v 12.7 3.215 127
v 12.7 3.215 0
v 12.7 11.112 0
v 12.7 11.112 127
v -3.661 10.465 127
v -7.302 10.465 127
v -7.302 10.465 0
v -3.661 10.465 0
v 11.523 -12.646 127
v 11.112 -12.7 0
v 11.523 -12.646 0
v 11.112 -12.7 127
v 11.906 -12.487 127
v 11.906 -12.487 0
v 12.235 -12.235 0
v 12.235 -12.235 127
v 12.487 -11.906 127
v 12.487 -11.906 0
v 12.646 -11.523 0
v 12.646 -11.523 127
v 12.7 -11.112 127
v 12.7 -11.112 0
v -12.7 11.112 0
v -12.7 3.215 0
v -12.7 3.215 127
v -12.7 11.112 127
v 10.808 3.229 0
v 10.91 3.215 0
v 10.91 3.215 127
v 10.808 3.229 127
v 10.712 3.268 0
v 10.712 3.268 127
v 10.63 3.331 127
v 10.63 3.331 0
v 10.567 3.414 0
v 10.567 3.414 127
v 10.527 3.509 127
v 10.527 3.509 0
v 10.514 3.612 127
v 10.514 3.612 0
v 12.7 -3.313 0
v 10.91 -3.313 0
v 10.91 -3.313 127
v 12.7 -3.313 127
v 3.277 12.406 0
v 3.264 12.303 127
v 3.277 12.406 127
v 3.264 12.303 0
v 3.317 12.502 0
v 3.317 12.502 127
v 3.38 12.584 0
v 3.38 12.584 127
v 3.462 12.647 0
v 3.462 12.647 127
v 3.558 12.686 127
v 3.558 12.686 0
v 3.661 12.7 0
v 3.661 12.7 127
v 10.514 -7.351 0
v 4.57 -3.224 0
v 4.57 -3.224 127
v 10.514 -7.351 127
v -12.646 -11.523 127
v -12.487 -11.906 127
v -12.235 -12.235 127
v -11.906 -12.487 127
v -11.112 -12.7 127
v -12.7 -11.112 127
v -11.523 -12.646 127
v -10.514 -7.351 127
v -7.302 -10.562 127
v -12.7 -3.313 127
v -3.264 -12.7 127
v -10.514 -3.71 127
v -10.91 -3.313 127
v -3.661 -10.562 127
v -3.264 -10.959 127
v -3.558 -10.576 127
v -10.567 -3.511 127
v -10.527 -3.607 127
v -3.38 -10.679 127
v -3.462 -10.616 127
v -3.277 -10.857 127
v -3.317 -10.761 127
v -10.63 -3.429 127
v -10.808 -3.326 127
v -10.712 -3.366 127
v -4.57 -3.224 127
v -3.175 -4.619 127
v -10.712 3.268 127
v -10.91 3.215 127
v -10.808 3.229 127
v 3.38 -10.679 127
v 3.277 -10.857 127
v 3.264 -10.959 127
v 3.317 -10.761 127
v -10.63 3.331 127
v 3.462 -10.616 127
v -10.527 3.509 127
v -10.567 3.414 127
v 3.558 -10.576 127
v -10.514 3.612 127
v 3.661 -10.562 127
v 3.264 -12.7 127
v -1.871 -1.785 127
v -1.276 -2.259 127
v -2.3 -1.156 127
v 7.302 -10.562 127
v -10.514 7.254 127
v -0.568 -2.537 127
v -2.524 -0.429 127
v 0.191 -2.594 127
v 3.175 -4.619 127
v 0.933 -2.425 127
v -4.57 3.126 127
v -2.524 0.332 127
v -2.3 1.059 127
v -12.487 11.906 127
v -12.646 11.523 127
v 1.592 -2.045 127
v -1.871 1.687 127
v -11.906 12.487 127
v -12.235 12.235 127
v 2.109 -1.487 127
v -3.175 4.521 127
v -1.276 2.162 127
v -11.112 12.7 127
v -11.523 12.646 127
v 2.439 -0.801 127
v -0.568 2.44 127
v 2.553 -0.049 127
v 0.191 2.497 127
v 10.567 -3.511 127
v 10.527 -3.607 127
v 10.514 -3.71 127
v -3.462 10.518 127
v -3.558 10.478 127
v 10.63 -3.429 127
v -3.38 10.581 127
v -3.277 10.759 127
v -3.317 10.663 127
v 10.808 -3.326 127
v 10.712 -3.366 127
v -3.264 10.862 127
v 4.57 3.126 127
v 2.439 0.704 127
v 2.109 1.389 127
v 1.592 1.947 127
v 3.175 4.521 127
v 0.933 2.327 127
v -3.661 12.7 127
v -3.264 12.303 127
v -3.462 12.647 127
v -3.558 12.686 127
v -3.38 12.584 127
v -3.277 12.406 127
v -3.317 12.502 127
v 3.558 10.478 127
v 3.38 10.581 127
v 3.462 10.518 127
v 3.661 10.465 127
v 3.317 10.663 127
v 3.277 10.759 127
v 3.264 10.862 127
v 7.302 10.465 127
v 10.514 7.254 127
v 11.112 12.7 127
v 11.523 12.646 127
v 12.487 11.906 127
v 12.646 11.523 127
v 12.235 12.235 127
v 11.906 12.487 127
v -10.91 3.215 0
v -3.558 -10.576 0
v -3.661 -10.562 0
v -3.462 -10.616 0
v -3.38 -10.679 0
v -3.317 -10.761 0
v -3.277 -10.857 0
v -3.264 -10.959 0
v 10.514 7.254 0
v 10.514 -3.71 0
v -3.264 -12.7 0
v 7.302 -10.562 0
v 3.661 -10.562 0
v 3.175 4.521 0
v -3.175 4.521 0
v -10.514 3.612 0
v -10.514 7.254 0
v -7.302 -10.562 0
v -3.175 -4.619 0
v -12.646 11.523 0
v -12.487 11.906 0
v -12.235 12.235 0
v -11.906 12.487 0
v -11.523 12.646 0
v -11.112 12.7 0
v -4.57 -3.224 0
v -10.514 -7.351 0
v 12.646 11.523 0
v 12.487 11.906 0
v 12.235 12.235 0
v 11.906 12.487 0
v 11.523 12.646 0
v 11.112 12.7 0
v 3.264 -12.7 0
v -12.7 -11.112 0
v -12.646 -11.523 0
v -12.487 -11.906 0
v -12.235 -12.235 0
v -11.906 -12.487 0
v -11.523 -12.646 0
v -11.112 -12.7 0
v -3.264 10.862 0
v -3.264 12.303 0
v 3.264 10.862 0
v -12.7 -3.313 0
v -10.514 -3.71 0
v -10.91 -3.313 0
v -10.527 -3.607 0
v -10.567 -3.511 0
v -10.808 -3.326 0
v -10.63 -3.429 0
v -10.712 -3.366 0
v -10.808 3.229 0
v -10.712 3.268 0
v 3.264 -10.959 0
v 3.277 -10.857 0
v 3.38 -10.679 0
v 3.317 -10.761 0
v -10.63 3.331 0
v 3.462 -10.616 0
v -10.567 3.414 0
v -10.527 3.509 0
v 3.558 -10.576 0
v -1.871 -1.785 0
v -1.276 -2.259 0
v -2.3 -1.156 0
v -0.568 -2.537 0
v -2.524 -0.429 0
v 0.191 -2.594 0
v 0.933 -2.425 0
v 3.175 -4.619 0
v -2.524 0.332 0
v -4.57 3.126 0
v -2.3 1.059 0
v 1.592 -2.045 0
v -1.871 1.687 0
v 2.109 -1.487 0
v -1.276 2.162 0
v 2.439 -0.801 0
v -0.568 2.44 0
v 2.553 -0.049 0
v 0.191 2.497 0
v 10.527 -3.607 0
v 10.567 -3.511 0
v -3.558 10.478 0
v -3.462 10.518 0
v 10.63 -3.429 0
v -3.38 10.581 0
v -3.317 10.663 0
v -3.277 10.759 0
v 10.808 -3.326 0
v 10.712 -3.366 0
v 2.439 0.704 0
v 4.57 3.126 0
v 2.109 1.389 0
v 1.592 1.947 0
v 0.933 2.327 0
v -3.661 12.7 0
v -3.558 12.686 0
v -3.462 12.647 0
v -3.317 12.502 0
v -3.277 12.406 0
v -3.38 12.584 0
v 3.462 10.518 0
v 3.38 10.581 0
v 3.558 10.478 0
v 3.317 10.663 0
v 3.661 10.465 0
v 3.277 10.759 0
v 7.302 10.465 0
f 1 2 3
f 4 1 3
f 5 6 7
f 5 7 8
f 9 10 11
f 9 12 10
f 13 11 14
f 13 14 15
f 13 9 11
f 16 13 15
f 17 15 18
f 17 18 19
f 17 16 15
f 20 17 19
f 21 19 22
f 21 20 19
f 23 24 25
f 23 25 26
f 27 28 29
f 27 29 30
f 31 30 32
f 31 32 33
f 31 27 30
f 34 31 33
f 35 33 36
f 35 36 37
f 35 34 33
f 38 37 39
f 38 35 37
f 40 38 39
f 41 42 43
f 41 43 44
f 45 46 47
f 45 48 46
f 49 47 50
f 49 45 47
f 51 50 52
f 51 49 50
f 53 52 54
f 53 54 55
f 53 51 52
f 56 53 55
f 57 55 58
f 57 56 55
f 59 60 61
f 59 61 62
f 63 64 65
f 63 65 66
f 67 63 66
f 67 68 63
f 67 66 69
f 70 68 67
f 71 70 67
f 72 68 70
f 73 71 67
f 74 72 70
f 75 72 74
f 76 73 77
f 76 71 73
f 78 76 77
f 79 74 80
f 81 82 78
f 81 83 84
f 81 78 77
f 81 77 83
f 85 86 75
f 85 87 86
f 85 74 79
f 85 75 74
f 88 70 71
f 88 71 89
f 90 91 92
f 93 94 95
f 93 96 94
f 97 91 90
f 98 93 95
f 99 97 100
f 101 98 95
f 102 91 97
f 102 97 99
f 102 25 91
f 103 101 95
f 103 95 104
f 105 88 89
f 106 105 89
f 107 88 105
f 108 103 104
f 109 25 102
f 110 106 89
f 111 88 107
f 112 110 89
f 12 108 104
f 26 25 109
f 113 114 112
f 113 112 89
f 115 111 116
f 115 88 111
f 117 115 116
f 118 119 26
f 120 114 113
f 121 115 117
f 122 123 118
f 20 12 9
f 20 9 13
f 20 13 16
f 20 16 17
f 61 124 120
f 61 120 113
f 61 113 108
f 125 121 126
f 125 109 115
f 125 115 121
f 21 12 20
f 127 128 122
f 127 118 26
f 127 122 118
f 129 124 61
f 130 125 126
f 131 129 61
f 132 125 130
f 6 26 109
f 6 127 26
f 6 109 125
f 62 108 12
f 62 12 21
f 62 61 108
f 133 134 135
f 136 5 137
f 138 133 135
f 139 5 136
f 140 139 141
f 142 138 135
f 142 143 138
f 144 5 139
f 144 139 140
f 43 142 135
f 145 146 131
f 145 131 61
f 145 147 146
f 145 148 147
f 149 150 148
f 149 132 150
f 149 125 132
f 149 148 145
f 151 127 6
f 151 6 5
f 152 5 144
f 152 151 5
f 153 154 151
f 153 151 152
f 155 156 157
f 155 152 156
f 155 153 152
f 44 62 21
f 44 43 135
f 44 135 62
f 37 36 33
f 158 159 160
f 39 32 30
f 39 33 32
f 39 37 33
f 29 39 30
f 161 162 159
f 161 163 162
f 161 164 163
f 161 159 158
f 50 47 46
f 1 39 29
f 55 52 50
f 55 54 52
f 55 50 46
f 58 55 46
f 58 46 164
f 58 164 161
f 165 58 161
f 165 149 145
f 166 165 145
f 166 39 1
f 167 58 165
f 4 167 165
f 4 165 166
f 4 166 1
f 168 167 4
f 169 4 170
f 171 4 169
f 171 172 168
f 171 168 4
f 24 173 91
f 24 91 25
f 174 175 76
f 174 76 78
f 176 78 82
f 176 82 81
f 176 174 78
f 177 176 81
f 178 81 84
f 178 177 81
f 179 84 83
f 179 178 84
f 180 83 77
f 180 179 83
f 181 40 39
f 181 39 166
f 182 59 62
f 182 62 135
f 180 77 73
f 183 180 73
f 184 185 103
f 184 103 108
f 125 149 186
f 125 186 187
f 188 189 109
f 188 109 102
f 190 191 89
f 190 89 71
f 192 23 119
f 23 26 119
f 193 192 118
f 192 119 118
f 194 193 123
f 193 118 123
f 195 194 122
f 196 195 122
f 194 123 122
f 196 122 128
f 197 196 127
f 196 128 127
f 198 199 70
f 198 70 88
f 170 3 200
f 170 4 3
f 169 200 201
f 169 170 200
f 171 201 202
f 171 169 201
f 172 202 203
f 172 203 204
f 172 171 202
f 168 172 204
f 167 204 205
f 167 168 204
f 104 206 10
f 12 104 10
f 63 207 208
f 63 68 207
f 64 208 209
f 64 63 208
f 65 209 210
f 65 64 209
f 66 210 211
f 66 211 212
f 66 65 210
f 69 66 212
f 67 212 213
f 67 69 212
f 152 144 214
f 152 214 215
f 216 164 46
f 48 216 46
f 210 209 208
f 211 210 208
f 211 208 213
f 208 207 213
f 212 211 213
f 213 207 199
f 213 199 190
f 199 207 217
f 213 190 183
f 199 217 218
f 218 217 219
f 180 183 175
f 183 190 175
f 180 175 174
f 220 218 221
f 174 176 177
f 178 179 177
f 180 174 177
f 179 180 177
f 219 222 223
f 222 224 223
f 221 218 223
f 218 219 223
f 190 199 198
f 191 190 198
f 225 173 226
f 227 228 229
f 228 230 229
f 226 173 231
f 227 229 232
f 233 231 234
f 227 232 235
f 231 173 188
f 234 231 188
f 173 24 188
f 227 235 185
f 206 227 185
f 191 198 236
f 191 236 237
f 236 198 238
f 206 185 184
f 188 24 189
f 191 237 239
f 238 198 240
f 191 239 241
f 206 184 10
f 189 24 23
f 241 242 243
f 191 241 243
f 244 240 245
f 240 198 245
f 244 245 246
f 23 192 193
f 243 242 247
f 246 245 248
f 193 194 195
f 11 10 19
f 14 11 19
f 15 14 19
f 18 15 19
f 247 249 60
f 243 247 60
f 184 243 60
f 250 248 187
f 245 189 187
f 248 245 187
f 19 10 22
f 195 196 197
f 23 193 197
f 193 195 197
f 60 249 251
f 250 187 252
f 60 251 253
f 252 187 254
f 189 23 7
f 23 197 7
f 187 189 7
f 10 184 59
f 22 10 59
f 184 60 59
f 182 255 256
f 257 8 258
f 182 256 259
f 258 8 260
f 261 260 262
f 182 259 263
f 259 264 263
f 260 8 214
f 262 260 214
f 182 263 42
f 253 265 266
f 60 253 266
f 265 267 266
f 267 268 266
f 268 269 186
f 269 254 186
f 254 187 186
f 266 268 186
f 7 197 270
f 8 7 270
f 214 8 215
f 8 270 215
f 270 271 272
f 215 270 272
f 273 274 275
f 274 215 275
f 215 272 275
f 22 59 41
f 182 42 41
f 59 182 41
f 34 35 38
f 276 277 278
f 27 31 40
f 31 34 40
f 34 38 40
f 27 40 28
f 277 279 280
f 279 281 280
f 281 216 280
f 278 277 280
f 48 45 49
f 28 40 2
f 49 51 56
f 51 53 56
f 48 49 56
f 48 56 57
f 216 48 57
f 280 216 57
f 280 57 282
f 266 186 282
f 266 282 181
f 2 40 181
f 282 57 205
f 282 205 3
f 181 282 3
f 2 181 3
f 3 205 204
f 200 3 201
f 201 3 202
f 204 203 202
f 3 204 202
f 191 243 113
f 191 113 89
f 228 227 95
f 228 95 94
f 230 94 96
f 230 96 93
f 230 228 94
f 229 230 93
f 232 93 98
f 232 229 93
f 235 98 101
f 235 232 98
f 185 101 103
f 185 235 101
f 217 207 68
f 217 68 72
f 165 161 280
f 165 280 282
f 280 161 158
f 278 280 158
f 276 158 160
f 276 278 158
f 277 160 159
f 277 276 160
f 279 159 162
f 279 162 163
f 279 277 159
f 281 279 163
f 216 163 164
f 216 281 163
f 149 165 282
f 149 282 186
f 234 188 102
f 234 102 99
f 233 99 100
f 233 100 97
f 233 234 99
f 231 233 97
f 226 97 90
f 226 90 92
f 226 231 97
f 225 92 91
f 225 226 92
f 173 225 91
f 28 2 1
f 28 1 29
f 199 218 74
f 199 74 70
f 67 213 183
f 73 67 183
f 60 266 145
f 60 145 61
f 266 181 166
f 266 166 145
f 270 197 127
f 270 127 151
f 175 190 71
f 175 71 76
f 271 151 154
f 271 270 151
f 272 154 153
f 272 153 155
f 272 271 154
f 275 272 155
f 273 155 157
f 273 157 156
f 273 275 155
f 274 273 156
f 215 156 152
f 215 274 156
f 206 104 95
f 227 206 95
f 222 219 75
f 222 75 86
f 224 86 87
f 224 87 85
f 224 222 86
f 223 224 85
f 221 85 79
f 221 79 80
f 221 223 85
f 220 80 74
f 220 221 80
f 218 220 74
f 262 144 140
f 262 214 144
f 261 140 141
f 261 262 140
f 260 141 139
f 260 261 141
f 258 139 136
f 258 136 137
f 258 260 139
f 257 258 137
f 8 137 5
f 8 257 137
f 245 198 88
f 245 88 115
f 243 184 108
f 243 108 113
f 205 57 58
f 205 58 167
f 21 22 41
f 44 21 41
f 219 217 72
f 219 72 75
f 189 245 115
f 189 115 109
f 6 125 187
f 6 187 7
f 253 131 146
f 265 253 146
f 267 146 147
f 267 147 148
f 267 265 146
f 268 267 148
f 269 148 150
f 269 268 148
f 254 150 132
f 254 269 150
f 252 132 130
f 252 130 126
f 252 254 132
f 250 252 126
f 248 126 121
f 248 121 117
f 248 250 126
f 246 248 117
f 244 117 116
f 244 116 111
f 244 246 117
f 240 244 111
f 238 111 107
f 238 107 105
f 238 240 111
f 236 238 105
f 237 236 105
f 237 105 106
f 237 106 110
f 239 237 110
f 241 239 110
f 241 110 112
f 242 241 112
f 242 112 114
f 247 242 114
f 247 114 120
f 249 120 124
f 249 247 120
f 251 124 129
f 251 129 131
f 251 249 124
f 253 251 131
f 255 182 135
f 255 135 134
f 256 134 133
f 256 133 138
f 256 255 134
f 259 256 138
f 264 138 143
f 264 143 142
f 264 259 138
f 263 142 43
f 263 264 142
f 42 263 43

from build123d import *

# Parameters (mm, degrees)
SKETCH1_W           = 25.4
SKETCH1_H           = 25.4
BOSS_EXTRUDE1_DEPTH = 127
FILLET1_R           = 1.5875
HOLE1_OUTLINE_R     = 2.5527
HOLE1_DEPTH         = 127
SKETCH7_W           = 6.5278
SKETCH7_H           = 2.2352
CUT_EXTRUDE2_DEPTH  = 127
FILLET4_R           = 0.396875
CIRPATTERN2_DEPTH   = 127


# Read off the part's stored shape, not the designer's step: Hole1, CirPattern2
with BuildPart() as part:
    # Sketch1 → Boss-Extrude1 (new body)
    with BuildSketch(Plane.XY):
        Rectangle(SKETCH1_W, SKETCH1_H)
    extrude(amount=BOSS_EXTRUDE1_DEPTH)

    # Fillet1
    fillet1_edges = [part.edges().sort_by_distance(p)[0] for p in [
        (12.7, -12.7, 63.5),
        (-12.7, -12.7, 63.5),
        (-12.7, 12.7, 63.5),
        (12.7, 12.7, 63.5),
    ]]
    fillet(fillet1_edges, radius=FILLET1_R)

    # Hole1 outline → Hole1 (cut)
    with BuildSketch(Plane.XY):
        with Locations((0, -0.048792482)):
            Circle(HOLE1_OUTLINE_R)
    extrude(amount=HOLE1_DEPTH, mode=Mode.SUBTRACT)

    # Sketch7 → Cut-Extrude2 (cut)
    with BuildSketch(Plane.XY.offset(127)):
        with Locations((0, 11.5824)):
            Rectangle(SKETCH7_W, SKETCH7_H)
        Polygon((-3.175, 4.5212), (-7.3025, 10.4648), (7.3025, 10.4648), (3.175, 4.5212), align=None)
    extrude(amount=-CUT_EXTRUDE2_DEPTH, mode=Mode.SUBTRACT)

    # Fillet4
    fillet4_edges = [part.edges().sort_by_distance(p)[0] for p in [
        (-3.2639, 10.4648, 63.5),
        (-3.2639, 12.7, 63.5),
        (3.2639, 12.7, 63.5),
        (3.2639, 10.4648, 63.5),
    ]]
    fillet(fillet4_edges, radius=FILLET4_R)

    # CirPattern2 outline → CirPattern2 (cut)
    with BuildSketch(Plane.XY):
        with BuildLine():
            ThreePointArc((-3.660775, -10.562384964), (-3.380141996, -10.67862696), (-3.2639, -10.959259964))
            Line((-3.2639, -10.959259964), (-3.2639, -12.7))
            Line((-3.2639, -12.7), (3.2639, -12.7))
            Line((3.2639, -12.7), (3.2639, -10.959259964))
            ThreePointArc((3.2639, -10.959259964), (3.380141996, -10.67862696), (3.660775, -10.562384964))
            Line((3.660775, -10.562384964), (7.3025, -10.562384964))
            Line((7.3025, -10.562384964), (3.175, -4.618784964))
            Line((3.175, -4.618784964), (-3.175, -4.618784964))
            Line((-3.175, -4.618784964), (-7.3025, -10.562384964))
            Line((-7.3025, -10.562384964), (-3.660775, -10.562384964))
        make_face()
        with BuildLine():
            Line((-12.7, -3.312692482), (-10.910467482, -3.312692482))
            ThreePointArc((-10.910467482, -3.312692482), (-10.629834478, -3.428934478), (-10.513592482, -3.709567482))
            Line((-10.513592482, -3.709567482), (-10.513592482, -7.351292482))
            Line((-10.513592482, -7.351292482), (-4.569992482, -3.223792482))
            Line((-4.569992482, -3.223792482), (-4.569992482, 3.126207518))
            Line((-4.569992482, 3.126207518), (-10.513592482, 7.253707518))
            Line((-10.513592482, 7.253707518), (-10.513592482, 3.611982518))
            ThreePointArc((-10.513592482, 3.611982518), (-10.629834478, 3.331349514), (-10.910467482, 3.215107518))
            Line((-10.910467482, 3.215107518), (-12.7, 3.215107518))
            Line((-12.7, 3.215107518), (-12.7, -3.312692482))
        make_face()
        with BuildLine():
            ThreePointArc((10.513592482, -3.709567482), (10.629834478, -3.428934478), (10.910467482, -3.312692482))
            Line((10.910467482, -3.312692482), (12.7, -3.312692482))
            Line((12.7, -3.312692482), (12.7, 3.215107518))
            Line((12.7, 3.215107518), (10.910467482, 3.215107518))
            ThreePointArc((10.910467482, 3.215107518), (10.629834478, 3.331349514), (10.513592482, 3.611982518))
            Line((10.513592482, 3.611982518), (10.513592482, 7.253707518))
            Line((10.513592482, 7.253707518), (4.569992482, 3.126207518))
            Line((4.569992482, 3.126207518), (4.569992482, -3.223792482))
            Line((4.569992482, -3.223792482), (10.513592482, -7.351292482))
            Line((10.513592482, -7.351292482), (10.513592482, -3.709567482))
        make_face()
    extrude(amount=CIRPATTERN2_DEPTH, mode=Mode.SUBTRACT)


solid = part.part
